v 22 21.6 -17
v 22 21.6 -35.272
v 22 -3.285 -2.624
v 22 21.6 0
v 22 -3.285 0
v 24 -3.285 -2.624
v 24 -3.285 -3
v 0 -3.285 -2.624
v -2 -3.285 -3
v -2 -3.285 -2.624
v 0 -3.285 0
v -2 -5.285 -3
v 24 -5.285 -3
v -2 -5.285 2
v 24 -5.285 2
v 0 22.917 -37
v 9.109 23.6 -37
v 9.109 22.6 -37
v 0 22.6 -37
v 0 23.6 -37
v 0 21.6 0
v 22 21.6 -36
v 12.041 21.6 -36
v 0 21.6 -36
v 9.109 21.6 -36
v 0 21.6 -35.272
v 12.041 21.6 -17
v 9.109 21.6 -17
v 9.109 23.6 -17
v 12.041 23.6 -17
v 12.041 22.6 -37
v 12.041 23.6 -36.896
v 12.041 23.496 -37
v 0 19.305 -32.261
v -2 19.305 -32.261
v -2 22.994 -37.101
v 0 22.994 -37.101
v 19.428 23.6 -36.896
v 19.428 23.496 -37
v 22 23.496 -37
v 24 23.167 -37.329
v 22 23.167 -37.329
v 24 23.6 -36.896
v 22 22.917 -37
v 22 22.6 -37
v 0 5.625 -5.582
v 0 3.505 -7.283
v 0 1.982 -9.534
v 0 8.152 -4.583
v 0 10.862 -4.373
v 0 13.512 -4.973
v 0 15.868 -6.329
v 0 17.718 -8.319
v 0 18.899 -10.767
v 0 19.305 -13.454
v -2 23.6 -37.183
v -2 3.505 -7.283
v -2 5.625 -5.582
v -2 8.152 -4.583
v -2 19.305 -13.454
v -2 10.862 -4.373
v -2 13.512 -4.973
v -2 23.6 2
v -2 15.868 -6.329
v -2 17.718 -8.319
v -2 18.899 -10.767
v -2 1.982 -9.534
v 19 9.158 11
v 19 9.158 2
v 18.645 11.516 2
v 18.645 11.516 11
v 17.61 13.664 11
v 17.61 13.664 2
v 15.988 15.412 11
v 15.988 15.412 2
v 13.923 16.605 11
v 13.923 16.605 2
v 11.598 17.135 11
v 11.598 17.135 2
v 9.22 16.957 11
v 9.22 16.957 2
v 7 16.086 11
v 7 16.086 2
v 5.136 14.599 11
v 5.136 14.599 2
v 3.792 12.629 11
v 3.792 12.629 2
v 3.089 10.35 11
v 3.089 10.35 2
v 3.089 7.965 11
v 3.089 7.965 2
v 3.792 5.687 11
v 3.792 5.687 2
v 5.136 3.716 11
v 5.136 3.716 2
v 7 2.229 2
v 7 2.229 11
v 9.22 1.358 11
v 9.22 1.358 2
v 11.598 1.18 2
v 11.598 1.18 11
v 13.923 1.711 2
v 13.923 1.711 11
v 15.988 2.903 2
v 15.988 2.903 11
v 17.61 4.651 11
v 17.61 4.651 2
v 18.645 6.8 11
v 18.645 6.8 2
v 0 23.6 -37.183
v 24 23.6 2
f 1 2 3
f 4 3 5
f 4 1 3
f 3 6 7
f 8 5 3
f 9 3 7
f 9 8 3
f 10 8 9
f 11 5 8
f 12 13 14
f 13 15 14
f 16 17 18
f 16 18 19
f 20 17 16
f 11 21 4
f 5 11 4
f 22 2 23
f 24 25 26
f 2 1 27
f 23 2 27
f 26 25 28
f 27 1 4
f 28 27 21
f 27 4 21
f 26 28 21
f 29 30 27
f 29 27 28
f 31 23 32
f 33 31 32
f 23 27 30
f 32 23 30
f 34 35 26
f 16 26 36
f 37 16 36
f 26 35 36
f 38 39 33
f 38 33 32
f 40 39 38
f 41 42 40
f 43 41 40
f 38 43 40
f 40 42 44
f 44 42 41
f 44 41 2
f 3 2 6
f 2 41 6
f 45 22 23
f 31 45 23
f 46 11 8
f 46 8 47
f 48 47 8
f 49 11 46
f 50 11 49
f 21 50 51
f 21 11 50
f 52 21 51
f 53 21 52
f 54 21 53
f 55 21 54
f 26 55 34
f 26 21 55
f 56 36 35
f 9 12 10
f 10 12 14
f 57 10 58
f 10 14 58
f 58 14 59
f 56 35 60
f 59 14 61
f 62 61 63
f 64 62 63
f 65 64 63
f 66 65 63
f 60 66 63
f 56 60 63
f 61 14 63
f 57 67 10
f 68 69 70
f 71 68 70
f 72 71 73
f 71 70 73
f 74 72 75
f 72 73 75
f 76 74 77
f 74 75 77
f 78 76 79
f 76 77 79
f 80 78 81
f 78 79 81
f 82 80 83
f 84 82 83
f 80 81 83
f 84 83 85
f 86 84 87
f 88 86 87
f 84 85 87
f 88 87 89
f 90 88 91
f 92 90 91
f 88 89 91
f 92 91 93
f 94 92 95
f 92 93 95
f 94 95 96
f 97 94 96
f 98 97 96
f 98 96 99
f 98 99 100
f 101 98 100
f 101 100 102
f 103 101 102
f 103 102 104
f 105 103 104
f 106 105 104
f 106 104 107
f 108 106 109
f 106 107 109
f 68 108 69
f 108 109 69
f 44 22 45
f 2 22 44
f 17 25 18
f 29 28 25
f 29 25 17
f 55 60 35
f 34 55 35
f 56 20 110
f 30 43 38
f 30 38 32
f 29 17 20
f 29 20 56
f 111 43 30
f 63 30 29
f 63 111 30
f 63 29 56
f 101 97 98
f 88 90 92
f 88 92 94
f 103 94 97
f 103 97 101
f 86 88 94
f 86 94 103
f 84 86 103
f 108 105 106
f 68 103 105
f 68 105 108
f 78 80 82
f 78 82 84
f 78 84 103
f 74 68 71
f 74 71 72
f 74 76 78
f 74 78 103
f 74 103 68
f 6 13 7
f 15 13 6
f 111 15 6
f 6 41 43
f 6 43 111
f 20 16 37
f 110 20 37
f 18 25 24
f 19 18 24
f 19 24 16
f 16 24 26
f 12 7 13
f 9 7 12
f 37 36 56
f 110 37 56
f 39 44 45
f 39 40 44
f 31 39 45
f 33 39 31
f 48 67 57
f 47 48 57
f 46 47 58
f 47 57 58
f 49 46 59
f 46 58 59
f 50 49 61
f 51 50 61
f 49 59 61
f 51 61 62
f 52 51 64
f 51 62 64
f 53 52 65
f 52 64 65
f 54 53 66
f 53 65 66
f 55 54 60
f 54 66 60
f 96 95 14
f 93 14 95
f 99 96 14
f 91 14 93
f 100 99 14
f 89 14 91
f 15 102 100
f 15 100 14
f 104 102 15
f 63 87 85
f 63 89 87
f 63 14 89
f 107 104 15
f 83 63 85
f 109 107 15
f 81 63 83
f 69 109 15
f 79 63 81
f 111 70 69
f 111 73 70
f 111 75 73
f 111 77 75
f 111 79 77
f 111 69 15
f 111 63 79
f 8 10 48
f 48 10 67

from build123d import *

# Parameters (mm, degrees)
SALIENTE_EXTRUIR1_DEPTH = 2
SALIENTE_EXTRUIR2_DEPTH = 2
SALIENTE_EXTRUIR3_DEPTH = 2
CROQUIS5_W              = 22
CROQUIS5_H              = 2
SALIENTE_EXTRUIR4_DEPTH = 17
CROQUIS6_W              = 26
CROQUIS6_H              = 2
SALIENTE_EXTRUIR5_DEPTH = 3
CROQUIS7_W              = 9.109165418
CROQUIS7_H              = 2
CROQUIS7_W_2            = 9.958756631
SALIENTE_EXTRUIR6_DEPTH = 20
CHAFL_N1_SIZE           = 1
CHAFL_N2_SIZE           = 1
CHAFL_N2_SIZE_2         = 0.713515305
CROQUIS8_R              = 8
SALIENTE_EXTRUIR7_DEPTH = 9


with BuildPart() as part:
    # Croquis1 → Saliente-Extruir1 (new body)
    with BuildSketch(Plane.XY):
        Polygon((-2, 23.6), (-2, 20.4), (-2, -5.284781413), (24, -5.284781413), (24, 20.4), (24, 23.6), align=None)
    extrude(amount=SALIENTE_EXTRUIR1_DEPTH)

    # Croquis2 → Saliente-Extruir2 (add)
    with BuildSketch(Plane(origin=(24, 0, 0), x_dir=(0, 0, -1), z_dir=(1, 0, 0))):
        Polygon((0, 23.6), (37.896029649, 23.6), (0, -5.284781413), align=None)
    extrude(amount=-SALIENTE_EXTRUIR2_DEPTH)

    # Croquis4 → Saliente-Extruir3 (add)
    with BuildSketch(Plane.ZY.offset(2)):
        with BuildLine():
            Line((-37.896029649, 23.6), (0, 23.6))
            Line((0, 23.6), (0, -5.284781413))
            Line((0, -5.284781413), (-9.534216457, 1.982305954))
            ThreePointArc((-9.534216457, 1.982305954), (-4.573867025, 12.209468647), (-13.454047634, 19.304700538))
            Line((-13.454047634, 19.304700538), (-32.260716249, 19.304700538))
            Line((-32.260716249, 19.304700538), (-37.896029649, 23.6))
        make_face()
    extrude(amount=-SALIENTE_EXTRUIR3_DEPTH)

    # Croquis5 → Saliente-Extruir4 (add)
    with BuildSketch(Plane(origin=(0, 0, 0), x_dir=(-1, 0, 0), z_dir=(0, 0, -1))):
        with Locations((-11, 22.6)):
            Rectangle(CROQUIS5_W, CROQUIS5_H)
    extrude(amount=SALIENTE_EXTRUIR4_DEPTH)

    # Croquis6 → Saliente-Extruir5 (add)
    with BuildSketch(Plane(origin=(0, 0, 0), x_dir=(-1, 0, 0), z_dir=(0, 0, -1))):
        with Locations((-11, -4.284781413)):
            Rectangle(CROQUIS6_W, CROQUIS6_H)
    extrude(amount=SALIENTE_EXTRUIR5_DEPTH)

    # Croquis7 → Saliente-Extruir6 (add)
    with BuildSketch(Plane(origin=(0, 0, -17), x_dir=(-1, 0, 0), z_dir=(0, 0, -1))):
        with Locations((-4.554582709, 22.6)):
            Rectangle(CROQUIS7_W, CROQUIS7_H)
        with Locations((-17.020621685, 22.6)):
            Rectangle(CROQUIS7_W_2, CROQUIS7_H)
    extrude(amount=SALIENTE_EXTRUIR6_DEPTH)

    # Chaflán1
    chafl_n1_edges = [part.edges().sort_by_distance(p)[0] for p in [
        (17.020621684, 21.6, -37),
        (4.554582709, 21.6, -37),
    ]]
    chamfer(chafl_n1_edges, length=CHAFL_N1_SIZE)

    # Chaflán2
    # the kernel refuses this chamfer: 1, 0.713515305 mm, written as the material it takes off along each edge
    with BuildSketch(Plane(origin=(26.571682988, 23.6, -37.896029649), x_dir=(0, 0, 1), z_dir=(-1, 0, 0))) as chafl_n2_piece_1:
        Polygon((CHAFL_N2_SIZE, 0), (CHAFL_N2_SIZE_2 * 0.79531418588, -CHAFL_N2_SIZE_2 * 0.606197446726), (0, 0), align=None)
    extrude(amount=7.143365976, mode=Mode.SUBTRACT)
    # the kernel refuses this chamfer: 1, 0.713515305 mm, written as the material it takes off along each edge
    with BuildSketch(Plane(origin=(22, 23.6, -37), x_dir=(0, 0, 1), z_dir=(-1, 0, 0))) as chafl_n2_2_piece_1_section:
        Polygon((CHAFL_N2_SIZE, 0), (0, -CHAFL_N2_SIZE), (0, 0), align=None)
    chafl_n2_2_piece_1 = extrude(amount=12.530439619, mode=Mode.PRIVATE)
    chafl_n2_2_piece_1 = split(chafl_n2_2_piece_1, bisect_by=Plane(origin=(22, 23.548014824, -36.948014824), z_dir=(-1.533293416683386e-15, 0.7071067811865533, -0.7071067811865418)), keep=Keep.TOP, mode=Mode.PRIVATE)
    add(chafl_n2_2_piece_1, mode=Mode.SUBTRACT)
    # the kernel refuses this chamfer: 1, 0.713515305 mm, written as the material it takes off along each edge
    with BuildSketch(Plane(origin=(-4.571682988, 23.6, -37.896029649), x_dir=(0, -0.6061974471264424, 0.7953141864052119), z_dir=(1, 0, 0))) as chafl_n2_3_piece_1:
        Polygon((CHAFL_N2_SIZE, 0), (CHAFL_N2_SIZE_2 * 0.79531418588, -CHAFL_N2_SIZE_2 * 0.606197446726), (0, 0), align=None)
    extrude(amount=7.143365976, mode=Mode.SUBTRACT)

    # Croquis8 → Saliente-Extruir7 (add)
    with BuildSketch(Plane.XY.offset(2)):
        with Locations((11, 9.157609293)):
            Circle(CROQUIS8_R)
    extrude(amount=SALIENTE_EXTRUIR7_DEPTH)


solid = part.part
